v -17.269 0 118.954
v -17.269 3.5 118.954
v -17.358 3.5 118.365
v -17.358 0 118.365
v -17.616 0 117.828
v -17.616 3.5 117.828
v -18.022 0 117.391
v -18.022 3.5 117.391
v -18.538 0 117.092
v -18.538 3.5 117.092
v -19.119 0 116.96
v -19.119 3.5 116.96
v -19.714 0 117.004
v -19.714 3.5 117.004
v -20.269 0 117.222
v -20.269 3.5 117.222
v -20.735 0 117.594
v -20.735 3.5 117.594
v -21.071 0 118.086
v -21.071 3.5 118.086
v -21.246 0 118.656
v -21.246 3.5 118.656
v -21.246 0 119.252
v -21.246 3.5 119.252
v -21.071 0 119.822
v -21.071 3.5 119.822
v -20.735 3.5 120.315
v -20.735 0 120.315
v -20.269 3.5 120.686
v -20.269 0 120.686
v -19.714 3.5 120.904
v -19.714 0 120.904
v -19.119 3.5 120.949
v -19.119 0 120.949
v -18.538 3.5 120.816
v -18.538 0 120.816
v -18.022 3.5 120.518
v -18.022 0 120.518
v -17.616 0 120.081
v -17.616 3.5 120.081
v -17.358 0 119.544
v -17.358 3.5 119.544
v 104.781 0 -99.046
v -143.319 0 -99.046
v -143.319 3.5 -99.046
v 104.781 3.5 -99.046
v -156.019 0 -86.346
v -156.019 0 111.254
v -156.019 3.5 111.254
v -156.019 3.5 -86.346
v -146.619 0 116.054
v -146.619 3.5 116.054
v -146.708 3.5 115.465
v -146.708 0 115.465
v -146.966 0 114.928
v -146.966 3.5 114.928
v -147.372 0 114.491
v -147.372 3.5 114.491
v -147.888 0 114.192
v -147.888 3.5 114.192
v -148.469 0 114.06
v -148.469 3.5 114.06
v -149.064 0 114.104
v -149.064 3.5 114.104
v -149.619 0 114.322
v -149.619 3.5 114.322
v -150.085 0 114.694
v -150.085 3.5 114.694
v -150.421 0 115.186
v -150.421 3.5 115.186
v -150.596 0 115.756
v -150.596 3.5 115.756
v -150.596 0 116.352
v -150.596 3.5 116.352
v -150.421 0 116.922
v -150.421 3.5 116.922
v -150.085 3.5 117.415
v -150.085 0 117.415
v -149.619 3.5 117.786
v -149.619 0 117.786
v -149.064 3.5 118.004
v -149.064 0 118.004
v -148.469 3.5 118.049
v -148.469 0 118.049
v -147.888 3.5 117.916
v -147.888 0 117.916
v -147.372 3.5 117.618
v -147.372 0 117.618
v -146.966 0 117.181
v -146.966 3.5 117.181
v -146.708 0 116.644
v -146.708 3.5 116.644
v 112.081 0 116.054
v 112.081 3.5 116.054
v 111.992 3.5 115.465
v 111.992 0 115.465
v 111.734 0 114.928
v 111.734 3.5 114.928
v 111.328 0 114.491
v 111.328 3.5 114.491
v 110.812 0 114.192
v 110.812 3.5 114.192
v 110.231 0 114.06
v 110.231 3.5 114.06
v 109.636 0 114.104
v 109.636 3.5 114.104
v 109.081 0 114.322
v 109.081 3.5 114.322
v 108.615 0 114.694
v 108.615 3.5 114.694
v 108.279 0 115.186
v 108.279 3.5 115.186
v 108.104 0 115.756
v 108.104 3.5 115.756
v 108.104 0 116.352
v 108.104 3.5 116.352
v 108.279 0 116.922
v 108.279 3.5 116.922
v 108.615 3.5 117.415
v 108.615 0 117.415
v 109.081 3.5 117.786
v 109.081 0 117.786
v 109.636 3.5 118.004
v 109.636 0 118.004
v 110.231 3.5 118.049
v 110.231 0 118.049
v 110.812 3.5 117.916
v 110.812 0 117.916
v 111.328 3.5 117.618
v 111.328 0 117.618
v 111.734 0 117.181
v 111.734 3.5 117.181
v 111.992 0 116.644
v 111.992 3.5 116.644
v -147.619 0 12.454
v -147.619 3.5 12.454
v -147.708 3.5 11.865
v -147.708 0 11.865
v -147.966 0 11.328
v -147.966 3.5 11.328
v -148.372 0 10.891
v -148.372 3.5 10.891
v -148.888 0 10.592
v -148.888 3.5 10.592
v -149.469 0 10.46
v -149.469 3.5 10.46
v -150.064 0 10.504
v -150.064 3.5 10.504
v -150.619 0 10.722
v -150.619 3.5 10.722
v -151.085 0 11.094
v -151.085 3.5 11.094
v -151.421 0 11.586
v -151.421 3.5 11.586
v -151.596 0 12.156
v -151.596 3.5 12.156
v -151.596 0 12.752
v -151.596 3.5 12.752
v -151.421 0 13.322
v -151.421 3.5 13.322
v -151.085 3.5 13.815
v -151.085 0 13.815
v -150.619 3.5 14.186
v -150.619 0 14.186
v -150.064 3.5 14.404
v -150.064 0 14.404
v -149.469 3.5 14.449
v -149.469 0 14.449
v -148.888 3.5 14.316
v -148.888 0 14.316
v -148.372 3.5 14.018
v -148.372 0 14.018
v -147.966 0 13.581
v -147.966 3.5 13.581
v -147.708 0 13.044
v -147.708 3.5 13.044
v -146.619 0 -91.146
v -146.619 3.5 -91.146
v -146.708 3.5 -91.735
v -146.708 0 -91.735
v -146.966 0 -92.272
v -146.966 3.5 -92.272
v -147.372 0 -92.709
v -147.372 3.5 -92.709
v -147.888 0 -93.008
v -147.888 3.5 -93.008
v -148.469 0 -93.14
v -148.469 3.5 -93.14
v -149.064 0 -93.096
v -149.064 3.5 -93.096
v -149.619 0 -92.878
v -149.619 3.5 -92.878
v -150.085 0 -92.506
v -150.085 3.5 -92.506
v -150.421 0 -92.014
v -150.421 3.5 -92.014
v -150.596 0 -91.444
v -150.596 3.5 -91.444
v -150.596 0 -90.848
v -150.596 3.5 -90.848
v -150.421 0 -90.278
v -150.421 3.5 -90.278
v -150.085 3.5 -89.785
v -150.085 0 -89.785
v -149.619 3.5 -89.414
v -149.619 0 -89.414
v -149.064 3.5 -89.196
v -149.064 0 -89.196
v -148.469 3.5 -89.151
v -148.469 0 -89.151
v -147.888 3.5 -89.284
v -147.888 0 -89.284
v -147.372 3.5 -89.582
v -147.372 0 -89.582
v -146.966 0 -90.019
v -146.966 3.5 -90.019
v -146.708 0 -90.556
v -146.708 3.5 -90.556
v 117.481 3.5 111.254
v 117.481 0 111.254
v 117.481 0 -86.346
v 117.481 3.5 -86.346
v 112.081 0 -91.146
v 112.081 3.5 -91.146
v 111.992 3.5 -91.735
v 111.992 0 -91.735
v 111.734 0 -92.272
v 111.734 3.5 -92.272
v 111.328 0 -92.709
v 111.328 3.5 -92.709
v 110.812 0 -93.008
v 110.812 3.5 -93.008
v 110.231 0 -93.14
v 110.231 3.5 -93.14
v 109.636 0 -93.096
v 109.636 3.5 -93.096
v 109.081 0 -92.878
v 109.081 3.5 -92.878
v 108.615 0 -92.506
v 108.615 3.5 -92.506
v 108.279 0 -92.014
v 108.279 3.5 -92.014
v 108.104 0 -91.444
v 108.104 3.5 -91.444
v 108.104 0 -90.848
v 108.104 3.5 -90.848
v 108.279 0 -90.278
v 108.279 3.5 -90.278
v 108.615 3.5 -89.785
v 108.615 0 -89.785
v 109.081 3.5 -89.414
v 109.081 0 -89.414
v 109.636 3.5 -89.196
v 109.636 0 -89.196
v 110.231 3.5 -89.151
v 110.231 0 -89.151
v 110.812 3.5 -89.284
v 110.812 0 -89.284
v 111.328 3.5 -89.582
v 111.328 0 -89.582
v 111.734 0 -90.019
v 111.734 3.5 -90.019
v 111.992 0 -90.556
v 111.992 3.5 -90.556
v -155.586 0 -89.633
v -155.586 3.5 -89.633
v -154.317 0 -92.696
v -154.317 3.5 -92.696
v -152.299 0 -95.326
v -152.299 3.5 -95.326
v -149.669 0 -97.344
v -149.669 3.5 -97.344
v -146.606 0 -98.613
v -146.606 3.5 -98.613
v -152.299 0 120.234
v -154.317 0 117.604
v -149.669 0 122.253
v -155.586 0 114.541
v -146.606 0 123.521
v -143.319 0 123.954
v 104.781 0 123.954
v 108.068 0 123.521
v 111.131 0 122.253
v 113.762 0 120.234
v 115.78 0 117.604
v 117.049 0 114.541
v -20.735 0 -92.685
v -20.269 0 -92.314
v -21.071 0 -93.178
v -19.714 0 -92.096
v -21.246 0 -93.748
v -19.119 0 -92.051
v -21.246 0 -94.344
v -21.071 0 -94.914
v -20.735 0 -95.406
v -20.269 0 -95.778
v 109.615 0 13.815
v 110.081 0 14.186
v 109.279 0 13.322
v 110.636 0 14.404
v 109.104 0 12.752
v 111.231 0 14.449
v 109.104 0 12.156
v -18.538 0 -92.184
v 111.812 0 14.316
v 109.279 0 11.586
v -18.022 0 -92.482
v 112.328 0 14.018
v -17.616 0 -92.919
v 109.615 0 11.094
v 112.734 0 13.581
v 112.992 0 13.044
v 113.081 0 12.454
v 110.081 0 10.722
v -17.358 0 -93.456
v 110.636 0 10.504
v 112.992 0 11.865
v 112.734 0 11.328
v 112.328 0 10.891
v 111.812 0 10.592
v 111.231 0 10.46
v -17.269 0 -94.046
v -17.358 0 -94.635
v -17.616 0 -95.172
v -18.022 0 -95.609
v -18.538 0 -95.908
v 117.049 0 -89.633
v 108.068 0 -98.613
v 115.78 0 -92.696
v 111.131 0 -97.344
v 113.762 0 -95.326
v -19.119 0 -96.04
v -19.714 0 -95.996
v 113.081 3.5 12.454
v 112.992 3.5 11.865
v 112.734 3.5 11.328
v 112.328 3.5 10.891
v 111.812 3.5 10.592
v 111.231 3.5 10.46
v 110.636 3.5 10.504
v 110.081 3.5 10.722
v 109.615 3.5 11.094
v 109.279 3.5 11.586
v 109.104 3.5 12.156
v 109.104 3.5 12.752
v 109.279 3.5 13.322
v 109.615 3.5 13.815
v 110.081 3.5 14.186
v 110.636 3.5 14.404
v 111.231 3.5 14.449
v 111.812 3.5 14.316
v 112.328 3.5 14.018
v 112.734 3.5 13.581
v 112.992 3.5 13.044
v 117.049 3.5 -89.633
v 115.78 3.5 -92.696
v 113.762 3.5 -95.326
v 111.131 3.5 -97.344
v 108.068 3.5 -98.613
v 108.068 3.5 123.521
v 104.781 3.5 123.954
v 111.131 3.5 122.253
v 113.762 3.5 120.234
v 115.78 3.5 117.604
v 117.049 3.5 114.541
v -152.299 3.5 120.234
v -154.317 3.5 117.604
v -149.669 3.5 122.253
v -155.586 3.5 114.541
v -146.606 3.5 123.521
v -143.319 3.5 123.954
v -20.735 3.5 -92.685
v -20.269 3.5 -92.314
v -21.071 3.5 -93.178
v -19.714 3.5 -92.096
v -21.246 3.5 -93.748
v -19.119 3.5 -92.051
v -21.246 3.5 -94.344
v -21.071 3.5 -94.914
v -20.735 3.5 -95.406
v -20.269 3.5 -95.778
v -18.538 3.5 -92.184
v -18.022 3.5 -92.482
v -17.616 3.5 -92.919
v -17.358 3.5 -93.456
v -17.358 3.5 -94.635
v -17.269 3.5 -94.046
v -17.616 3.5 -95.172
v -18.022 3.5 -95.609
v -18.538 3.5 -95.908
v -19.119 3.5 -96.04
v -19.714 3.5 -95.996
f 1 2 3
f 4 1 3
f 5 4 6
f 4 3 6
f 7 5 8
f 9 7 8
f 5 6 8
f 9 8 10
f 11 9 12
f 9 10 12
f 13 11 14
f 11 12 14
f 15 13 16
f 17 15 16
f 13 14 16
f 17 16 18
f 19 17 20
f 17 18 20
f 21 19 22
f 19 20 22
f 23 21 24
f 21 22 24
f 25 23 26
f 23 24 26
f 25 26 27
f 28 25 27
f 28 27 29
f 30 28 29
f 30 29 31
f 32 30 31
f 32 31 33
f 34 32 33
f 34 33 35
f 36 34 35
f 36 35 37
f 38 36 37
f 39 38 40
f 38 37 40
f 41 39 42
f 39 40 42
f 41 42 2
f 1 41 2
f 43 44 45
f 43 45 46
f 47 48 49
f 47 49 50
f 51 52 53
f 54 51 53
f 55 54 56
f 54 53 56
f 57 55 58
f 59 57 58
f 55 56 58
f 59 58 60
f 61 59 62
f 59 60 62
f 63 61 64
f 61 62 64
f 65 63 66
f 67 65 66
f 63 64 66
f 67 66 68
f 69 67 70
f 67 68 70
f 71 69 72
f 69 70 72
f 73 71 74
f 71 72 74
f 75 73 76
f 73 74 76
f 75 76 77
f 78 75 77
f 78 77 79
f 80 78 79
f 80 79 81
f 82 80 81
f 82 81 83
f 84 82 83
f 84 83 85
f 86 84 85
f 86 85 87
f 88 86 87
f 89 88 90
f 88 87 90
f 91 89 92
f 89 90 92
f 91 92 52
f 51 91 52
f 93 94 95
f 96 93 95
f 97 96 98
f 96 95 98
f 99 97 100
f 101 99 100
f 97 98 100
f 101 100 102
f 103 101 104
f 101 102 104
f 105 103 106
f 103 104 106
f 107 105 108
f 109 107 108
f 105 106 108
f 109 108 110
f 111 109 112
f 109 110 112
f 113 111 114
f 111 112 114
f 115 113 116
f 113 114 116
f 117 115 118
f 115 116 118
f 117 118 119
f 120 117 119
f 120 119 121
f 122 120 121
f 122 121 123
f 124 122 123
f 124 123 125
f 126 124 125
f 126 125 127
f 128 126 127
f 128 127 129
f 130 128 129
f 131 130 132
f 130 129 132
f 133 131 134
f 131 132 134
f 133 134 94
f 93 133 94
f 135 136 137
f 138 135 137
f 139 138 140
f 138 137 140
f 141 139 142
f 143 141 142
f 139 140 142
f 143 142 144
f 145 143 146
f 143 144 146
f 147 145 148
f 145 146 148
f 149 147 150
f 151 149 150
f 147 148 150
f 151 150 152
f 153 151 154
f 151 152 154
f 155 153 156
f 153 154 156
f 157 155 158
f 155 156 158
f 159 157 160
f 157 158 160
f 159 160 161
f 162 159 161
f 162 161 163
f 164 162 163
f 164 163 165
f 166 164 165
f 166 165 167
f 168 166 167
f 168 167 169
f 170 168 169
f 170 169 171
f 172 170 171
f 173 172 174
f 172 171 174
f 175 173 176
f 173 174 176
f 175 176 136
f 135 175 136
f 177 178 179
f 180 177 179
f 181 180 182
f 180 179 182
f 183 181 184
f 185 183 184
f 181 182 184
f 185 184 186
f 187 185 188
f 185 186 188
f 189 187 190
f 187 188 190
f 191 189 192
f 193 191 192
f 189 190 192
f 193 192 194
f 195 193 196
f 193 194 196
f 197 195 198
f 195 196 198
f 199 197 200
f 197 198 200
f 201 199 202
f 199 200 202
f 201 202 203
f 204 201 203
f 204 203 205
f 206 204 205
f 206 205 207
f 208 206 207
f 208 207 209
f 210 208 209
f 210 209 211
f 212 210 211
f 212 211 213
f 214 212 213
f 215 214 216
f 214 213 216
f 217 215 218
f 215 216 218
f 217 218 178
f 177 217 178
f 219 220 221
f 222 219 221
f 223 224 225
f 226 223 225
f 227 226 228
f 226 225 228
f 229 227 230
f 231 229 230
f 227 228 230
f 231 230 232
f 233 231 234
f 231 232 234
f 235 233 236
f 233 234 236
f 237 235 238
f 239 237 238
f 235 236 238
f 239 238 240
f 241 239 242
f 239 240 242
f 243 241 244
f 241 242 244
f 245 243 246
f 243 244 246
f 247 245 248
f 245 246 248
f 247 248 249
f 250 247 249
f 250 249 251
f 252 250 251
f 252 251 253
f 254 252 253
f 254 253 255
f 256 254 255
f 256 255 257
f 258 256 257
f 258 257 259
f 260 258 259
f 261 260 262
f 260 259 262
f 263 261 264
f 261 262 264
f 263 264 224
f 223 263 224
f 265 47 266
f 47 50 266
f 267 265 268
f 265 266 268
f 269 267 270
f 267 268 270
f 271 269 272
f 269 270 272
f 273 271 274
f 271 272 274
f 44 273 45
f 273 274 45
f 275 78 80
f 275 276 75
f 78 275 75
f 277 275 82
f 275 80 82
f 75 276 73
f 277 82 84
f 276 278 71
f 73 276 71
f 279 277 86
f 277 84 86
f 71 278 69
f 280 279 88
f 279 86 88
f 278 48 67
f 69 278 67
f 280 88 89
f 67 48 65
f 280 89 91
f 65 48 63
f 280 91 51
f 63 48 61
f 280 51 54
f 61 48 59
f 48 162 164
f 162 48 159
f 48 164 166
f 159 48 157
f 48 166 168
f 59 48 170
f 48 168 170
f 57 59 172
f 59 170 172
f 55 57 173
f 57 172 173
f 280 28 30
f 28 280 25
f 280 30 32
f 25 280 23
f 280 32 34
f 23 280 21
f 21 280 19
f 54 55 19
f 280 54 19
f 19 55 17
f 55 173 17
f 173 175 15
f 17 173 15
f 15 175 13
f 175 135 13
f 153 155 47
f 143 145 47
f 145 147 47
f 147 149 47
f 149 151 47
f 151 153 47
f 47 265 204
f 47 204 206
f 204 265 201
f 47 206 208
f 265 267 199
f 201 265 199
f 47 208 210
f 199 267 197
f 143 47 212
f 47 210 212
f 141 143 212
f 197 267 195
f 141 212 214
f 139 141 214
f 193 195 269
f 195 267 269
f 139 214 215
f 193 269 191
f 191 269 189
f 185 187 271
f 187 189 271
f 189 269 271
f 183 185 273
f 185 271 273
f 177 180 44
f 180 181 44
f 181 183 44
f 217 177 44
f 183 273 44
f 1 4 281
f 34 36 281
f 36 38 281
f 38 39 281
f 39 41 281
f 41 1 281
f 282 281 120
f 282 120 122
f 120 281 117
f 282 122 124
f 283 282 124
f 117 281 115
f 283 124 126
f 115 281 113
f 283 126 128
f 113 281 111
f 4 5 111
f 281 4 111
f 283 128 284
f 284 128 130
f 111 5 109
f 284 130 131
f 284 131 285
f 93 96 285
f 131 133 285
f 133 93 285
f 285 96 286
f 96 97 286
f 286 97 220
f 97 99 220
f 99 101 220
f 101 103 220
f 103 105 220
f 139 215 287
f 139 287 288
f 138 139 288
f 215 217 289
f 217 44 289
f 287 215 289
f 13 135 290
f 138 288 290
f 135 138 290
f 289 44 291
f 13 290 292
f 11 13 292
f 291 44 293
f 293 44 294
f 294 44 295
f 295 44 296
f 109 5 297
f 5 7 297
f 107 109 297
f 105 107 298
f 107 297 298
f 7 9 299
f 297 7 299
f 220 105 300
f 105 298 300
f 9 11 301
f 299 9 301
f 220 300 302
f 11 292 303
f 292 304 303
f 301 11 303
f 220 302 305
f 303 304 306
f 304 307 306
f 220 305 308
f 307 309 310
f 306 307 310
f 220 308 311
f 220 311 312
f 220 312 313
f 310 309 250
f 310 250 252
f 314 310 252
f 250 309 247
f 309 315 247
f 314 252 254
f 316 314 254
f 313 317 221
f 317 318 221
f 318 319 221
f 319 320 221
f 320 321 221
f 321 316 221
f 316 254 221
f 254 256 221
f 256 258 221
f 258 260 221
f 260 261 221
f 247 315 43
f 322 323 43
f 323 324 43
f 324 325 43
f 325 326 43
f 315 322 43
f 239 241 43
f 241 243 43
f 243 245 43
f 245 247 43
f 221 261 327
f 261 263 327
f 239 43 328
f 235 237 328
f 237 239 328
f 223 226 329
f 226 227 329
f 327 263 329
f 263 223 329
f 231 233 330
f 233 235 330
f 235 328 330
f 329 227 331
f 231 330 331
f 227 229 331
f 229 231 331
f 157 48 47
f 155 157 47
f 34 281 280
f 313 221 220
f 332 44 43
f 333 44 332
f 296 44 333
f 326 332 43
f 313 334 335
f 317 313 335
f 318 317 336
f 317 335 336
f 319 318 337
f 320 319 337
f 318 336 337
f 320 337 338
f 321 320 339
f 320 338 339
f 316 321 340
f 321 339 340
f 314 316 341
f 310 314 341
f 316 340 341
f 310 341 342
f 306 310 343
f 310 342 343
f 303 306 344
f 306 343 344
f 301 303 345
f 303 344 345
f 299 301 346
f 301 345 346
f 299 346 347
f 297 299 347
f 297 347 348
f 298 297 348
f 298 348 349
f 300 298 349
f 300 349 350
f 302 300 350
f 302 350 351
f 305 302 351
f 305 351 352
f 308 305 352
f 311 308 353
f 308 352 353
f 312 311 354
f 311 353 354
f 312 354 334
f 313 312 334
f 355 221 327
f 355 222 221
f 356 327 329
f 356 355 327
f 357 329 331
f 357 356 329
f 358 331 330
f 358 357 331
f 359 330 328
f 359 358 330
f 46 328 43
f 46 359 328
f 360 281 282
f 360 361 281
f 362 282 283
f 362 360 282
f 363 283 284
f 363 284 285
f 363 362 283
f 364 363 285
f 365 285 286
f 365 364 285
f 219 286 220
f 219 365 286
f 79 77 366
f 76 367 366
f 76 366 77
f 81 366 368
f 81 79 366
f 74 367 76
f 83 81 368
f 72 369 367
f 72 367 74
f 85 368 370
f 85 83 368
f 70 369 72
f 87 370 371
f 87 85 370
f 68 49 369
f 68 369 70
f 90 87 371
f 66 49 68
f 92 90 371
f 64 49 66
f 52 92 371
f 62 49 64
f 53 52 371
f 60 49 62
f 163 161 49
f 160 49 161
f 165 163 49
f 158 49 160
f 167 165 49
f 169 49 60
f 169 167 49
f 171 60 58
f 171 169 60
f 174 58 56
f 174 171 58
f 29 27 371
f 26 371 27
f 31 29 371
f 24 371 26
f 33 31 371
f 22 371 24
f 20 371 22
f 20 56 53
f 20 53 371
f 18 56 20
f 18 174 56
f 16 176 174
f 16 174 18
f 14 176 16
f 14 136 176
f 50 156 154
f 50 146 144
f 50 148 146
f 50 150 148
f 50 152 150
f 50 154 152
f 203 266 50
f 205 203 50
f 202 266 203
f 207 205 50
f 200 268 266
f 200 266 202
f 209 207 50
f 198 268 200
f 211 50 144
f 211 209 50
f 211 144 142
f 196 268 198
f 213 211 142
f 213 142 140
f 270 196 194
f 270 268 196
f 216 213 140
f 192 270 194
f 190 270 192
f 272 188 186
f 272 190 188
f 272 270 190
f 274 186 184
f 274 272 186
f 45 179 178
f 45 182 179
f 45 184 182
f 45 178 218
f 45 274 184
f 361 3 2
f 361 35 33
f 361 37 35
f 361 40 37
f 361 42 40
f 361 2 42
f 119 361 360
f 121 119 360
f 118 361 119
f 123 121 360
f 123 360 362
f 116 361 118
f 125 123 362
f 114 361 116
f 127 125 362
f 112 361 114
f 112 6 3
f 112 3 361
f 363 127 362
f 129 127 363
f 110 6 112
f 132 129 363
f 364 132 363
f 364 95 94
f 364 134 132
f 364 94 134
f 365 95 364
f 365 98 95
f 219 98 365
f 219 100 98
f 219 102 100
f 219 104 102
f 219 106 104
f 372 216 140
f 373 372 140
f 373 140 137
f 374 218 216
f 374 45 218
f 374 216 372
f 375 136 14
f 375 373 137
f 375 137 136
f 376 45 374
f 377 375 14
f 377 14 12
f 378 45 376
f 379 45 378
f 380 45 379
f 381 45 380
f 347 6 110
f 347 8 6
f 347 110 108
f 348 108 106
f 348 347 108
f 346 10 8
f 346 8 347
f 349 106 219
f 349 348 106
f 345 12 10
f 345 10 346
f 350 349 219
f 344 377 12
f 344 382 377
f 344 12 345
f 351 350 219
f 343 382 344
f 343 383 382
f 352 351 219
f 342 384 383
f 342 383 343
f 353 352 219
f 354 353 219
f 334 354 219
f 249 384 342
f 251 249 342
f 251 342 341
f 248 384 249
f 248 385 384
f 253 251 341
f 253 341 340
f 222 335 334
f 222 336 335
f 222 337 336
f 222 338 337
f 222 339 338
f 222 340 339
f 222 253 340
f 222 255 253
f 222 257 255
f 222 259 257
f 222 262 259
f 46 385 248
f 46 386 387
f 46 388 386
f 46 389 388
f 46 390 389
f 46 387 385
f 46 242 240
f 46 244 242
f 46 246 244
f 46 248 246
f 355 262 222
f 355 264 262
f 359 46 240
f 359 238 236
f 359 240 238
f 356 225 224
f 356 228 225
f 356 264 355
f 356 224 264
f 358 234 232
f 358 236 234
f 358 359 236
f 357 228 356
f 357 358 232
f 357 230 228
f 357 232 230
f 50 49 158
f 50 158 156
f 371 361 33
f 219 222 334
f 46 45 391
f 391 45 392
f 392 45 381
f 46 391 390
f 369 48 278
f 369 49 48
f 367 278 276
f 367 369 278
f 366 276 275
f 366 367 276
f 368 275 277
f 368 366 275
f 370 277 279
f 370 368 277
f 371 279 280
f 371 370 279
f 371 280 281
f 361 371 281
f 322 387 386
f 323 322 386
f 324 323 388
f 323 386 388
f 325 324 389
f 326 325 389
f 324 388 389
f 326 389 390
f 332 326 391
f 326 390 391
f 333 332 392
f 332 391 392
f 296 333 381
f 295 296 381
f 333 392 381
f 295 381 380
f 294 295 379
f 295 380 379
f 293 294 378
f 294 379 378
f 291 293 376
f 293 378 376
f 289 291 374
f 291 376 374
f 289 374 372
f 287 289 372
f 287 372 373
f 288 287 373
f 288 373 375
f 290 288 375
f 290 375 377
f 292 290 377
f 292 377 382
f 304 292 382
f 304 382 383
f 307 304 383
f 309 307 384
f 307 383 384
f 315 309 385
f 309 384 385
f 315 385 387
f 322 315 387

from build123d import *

# Parameters (mm, degrees)
SKETCH1_W           = 273.5
SKETCH1_H           = 223
BOSS_EXTRUDE1_DEPTH = 3.5
FILLET1_R           = 12.7
SKETCH2_R           = 2
CUT_EXTRUDE1_DEPTH  = 3.5


with BuildPart() as part:
    # Sketch1 → Boss-Extrude1 (new body)
    with BuildSketch(Plane(origin=(0, 0, 0), x_dir=(1, 0, 0), z_dir=(0, 1, 0))):
        with Locations((-19.268652803, -12.454205426)):
            Rectangle(SKETCH1_W, SKETCH1_H)
    extrude(amount=BOSS_EXTRUDE1_DEPTH)

    # Fillet1
    fillet1_edges = [part.edges().sort_by_distance(p)[0] for p in [
        (-156.018652803, 1.75, -99.045794574),
        (117.481347197, 1.75, -99.045794574),
        (117.481347197, 1.75, 123.954205426),
        (-156.018652803, 1.75, 123.954205426),
    ]]
    fillet(fillet1_edges, radius=FILLET1_R)

    # Sketch2 → Cut-Extrude1 (cut)
    with BuildSketch(Plane(origin=(0, 3.5, 0), x_dir=(1, 0, 0), z_dir=(0, 1, 0))):
        with Locations((-19.268652803, 94.045794574)):
            Circle(SKETCH2_R)
        with Locations((-148.618652803, 91.145794574)):
            Circle(SKETCH2_R)
        with Locations((110.081347197, 91.145794574)):
            Circle(SKETCH2_R)
        with Locations((110.081347197, -116.054205426)):
            Circle(SKETCH2_R)
        with Locations((-148.618652803, -116.054205426)):
            Circle(SKETCH2_R)
        with Locations((-19.268652803, -118.954205426)):
            Circle(SKETCH2_R)
        with Locations((111.081347197, -12.454205426)):
            Circle(SKETCH2_R)
        with Locations((-149.618652803, -12.454205426)):
            Circle(SKETCH2_R)
    extrude(amount=-CUT_EXTRUDE1_DEPTH, mode=Mode.SUBTRACT)


solid = part.part
